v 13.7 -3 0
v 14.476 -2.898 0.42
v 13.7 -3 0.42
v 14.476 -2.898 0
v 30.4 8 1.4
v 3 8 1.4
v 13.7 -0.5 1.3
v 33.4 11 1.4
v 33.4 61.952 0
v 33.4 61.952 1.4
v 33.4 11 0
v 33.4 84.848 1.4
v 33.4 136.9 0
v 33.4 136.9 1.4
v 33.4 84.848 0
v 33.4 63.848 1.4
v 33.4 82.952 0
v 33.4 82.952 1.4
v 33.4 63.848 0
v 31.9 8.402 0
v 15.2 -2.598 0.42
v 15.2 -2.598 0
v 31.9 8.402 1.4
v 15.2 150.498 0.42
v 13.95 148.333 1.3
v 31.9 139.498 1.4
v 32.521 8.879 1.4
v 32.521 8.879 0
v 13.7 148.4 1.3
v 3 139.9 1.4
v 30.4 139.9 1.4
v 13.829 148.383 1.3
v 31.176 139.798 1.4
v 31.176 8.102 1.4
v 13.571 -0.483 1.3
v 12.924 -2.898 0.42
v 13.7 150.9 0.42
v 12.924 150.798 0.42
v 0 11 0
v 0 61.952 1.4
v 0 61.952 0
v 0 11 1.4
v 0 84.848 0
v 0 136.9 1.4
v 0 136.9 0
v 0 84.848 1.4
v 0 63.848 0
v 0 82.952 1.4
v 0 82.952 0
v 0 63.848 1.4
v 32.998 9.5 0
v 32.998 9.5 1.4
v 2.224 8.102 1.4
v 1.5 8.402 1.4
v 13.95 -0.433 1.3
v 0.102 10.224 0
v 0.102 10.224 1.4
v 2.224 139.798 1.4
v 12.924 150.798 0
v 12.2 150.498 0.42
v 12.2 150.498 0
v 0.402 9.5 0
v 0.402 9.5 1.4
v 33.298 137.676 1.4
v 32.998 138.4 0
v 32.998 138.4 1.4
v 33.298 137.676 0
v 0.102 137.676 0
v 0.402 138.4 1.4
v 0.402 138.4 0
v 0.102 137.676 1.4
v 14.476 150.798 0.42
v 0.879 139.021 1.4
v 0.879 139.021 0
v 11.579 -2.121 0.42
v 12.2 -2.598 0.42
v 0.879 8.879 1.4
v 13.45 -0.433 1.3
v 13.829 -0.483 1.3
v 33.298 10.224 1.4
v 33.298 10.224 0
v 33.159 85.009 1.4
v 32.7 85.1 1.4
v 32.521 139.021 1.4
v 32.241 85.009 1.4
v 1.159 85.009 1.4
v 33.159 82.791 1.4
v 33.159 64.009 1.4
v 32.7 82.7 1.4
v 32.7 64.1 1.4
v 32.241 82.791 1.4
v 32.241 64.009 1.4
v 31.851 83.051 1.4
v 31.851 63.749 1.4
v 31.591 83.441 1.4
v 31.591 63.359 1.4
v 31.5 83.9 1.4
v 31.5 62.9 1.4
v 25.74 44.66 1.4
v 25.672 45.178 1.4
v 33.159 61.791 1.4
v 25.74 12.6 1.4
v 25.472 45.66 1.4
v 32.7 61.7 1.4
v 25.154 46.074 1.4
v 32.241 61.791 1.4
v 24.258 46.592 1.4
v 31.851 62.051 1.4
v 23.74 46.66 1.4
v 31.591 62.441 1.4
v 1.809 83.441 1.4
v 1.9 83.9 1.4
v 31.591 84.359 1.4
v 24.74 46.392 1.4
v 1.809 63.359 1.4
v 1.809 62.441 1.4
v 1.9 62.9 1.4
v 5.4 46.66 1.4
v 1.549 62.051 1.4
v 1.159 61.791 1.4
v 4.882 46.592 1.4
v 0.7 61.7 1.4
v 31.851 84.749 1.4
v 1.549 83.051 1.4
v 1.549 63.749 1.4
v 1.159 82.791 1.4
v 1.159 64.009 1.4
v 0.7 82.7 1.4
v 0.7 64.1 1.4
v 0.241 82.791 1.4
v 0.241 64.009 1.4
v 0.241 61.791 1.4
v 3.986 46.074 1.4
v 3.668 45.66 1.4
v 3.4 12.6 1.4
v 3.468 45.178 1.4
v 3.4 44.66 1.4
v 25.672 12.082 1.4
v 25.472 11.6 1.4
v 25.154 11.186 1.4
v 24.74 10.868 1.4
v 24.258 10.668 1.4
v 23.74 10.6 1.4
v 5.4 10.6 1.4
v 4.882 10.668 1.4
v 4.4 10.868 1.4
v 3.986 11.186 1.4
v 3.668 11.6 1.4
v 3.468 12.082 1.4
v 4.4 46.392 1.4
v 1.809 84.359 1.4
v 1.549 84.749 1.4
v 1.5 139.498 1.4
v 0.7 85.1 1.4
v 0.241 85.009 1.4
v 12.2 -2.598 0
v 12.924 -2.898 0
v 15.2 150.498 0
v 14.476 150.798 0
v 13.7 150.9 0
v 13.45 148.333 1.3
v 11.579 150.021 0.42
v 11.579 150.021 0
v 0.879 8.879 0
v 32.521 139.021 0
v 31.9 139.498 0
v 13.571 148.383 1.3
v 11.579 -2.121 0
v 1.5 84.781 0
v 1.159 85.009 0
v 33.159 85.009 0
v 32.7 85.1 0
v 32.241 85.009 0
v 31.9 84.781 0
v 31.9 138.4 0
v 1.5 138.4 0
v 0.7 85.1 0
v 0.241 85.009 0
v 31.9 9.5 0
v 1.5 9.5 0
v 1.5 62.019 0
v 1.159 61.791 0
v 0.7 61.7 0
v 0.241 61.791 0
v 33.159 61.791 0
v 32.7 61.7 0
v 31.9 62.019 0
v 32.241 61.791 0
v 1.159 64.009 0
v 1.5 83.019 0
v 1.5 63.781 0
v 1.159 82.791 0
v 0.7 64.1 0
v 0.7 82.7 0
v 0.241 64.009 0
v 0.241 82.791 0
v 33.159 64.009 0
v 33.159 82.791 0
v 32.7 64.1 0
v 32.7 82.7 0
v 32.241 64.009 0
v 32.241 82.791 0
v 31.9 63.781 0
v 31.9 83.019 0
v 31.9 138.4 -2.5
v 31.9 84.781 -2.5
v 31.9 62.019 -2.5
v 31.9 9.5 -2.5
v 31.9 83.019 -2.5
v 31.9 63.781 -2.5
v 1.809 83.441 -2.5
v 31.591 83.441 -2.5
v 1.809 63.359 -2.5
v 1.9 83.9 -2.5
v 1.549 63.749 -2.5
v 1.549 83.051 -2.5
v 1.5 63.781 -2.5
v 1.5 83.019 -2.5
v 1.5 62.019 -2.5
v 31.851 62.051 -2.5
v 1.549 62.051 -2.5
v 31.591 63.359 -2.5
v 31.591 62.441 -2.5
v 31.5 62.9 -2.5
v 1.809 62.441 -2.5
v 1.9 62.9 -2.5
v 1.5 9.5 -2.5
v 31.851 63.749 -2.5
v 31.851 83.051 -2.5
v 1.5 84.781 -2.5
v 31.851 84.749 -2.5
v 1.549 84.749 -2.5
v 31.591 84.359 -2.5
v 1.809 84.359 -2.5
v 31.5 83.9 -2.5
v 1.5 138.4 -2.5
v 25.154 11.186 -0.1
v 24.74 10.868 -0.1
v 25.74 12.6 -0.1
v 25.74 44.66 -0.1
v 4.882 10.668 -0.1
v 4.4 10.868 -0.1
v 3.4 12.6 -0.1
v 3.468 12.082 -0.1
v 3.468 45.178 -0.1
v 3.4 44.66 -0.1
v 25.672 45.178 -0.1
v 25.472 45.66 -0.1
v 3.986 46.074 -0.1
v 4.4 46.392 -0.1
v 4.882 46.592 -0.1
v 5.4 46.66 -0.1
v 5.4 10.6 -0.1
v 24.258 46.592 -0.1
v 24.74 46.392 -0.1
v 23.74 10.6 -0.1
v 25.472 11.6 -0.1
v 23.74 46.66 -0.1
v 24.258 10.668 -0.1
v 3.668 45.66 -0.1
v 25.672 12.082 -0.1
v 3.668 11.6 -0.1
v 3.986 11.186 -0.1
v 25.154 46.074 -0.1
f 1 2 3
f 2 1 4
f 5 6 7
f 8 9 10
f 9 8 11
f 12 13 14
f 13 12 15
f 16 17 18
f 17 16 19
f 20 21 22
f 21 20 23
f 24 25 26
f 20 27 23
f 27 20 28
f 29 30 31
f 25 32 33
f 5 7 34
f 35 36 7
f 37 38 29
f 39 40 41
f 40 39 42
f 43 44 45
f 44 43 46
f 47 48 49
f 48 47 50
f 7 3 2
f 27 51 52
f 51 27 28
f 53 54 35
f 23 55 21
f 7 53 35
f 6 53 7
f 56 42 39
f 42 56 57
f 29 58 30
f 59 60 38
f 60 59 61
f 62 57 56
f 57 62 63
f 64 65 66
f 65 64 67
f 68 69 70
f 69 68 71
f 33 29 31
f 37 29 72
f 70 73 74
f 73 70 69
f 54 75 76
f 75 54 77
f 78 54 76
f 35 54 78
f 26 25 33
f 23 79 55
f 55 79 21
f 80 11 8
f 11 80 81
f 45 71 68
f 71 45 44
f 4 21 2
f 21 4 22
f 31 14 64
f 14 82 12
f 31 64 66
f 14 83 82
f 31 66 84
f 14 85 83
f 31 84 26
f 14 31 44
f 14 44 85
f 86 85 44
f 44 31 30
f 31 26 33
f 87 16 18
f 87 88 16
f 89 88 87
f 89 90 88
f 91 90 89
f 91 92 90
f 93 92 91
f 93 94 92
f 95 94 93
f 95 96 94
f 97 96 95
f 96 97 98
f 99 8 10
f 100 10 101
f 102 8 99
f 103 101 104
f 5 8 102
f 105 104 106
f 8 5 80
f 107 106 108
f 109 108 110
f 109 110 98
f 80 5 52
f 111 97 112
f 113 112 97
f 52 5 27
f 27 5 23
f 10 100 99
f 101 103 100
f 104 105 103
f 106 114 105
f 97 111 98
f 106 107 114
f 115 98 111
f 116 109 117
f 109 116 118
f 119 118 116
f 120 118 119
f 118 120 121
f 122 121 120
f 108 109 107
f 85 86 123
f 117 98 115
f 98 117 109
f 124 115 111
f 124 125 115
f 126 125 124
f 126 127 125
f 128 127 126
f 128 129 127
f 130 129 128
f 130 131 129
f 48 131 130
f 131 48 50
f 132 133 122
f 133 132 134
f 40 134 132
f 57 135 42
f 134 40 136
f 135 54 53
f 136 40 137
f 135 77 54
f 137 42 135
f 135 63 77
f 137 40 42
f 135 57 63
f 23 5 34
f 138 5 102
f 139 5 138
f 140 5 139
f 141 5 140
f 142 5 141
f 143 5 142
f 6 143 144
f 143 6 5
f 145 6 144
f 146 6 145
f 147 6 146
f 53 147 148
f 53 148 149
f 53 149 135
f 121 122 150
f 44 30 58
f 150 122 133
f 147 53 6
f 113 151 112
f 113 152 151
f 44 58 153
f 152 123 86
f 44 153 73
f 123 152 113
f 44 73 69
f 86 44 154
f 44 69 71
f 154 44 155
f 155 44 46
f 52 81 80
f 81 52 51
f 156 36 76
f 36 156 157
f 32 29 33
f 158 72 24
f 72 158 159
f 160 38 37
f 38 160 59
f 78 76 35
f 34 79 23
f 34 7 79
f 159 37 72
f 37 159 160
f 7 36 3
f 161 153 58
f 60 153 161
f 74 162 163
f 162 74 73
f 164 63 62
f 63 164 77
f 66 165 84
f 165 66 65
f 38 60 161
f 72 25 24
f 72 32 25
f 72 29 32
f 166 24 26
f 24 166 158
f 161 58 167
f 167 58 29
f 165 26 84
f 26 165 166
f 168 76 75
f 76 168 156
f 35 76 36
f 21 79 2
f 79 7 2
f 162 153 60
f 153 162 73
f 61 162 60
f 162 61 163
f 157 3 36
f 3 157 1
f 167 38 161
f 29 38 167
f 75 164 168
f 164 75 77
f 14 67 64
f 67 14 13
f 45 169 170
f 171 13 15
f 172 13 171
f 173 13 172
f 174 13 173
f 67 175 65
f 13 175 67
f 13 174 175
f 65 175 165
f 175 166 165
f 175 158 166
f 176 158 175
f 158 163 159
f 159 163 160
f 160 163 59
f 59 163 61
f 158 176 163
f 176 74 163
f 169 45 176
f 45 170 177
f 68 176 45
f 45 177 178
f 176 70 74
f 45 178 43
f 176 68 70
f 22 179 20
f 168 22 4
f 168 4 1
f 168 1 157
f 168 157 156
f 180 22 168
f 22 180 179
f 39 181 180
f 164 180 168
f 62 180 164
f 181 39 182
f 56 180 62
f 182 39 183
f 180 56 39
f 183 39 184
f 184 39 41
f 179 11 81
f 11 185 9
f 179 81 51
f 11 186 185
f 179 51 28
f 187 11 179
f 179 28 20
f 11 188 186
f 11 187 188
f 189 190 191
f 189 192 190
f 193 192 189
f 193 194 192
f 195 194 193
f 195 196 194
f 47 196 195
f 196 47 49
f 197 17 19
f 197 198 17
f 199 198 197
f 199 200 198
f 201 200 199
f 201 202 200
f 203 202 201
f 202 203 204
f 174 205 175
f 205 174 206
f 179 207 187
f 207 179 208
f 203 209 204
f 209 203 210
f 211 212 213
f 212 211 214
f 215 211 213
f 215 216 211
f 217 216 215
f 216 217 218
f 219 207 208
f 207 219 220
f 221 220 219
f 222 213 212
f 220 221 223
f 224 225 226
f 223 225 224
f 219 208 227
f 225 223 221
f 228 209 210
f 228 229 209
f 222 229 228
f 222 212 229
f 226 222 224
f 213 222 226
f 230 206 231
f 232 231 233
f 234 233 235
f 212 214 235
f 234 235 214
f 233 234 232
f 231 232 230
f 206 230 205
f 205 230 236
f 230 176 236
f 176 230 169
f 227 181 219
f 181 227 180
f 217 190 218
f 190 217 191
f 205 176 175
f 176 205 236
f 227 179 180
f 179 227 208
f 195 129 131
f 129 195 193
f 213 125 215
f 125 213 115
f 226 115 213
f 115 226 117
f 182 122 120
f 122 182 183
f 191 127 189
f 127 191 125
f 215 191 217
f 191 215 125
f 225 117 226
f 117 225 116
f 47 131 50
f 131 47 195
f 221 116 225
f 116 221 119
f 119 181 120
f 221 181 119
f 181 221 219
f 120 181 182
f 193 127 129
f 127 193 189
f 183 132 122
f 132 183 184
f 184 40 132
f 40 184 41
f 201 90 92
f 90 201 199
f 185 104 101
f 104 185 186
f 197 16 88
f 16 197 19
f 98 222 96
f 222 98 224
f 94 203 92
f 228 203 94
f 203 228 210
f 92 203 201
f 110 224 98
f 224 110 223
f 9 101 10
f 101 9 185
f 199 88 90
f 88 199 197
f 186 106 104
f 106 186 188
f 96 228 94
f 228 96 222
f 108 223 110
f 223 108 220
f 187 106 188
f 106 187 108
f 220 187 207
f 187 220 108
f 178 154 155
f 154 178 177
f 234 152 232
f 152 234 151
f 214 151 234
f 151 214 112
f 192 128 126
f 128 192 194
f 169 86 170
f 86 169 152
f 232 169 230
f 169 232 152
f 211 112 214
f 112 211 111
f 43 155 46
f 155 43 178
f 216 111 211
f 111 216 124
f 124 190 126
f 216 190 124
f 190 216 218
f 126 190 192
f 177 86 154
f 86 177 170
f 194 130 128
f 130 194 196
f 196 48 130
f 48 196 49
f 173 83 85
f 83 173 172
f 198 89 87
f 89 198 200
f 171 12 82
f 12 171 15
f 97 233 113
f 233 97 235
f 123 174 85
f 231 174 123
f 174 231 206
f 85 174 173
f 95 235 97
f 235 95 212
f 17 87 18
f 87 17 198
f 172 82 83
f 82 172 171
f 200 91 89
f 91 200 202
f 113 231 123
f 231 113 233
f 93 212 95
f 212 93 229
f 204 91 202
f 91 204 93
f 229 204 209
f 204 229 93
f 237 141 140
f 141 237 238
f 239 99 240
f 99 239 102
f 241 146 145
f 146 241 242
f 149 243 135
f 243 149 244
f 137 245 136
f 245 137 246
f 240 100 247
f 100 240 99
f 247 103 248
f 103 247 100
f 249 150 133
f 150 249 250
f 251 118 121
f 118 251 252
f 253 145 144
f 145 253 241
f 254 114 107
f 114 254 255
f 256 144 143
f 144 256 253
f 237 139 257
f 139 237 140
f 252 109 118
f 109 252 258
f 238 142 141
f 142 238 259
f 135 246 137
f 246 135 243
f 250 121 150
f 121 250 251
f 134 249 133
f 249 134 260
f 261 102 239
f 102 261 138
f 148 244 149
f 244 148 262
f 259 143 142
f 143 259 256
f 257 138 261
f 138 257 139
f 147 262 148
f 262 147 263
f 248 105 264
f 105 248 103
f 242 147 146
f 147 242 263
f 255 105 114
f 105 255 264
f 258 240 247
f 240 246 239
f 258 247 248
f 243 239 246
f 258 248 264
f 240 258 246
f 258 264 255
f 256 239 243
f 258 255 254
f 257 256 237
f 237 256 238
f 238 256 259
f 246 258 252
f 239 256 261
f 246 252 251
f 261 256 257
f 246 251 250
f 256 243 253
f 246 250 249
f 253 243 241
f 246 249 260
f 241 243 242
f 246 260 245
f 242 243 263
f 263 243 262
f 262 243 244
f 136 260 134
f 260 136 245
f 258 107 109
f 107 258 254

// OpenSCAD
// Wasserraketen-Tracker — Deckel
// Passt auf rocket_case.scad v4
// Nur Display-Fenster offen · M2-Schrauben an den 4 PCB-Bossen

// ── Parameter (identisch mit rocket_case.scad) ────────────────────────────────
wall      = 1.4;
tol       = 0.3;

board_w   = 28.6;
board_l   = 43.5;
board_h   = 9.6;
sensor_l  = 37.0;
gap       = 2.0;
bat_w     = 30.0;
bat_l     = 44.0;

disp_w    = 22.34;
disp_h    = 36.06;
disp_off_x =  3.1;
disp_off_y =  2.3;

inner_w = max(board_w, bat_w) + tol * 2;
inner_l = board_l + gap + sensor_l + gap + bat_l + tol * 2;
inner_h = board_h + 3.0;

outer_w = inner_w + wall * 2;
outer_l = inner_l + wall * 2;
outer_h = inner_h + wall;

fairing  = 8.0;   // identisch mit rocket_tracker.scad
total_l  = outer_l + fairing * 2;

// Deckeldicke + Zunge
lid_h    = wall;        // obere Platte
tongue_h = 2.5;         // Zunge greift in Gehäuse
tongue_t = 0.1;         // Spiel Zunge → Gehäuse (Presspassung)

// Display-Fenster (gleiche Offsets wie Gehäuse)
disp_ox = disp_off_x + tol;
disp_oy = disp_off_y + tol + fairing;

// Deckel-Schraubenlöcher (gleiche Positionen wie Lid-Bossen im Gehäuse)
lid_m2_d    = 2.4;
lid_boss_r  = 3.0;
lid_y1      = fairing + wall + board_l + gap + 8;
lid_y2      = fairing + wall + board_l + gap + sensor_l - 8;

// ── Hilfsfunktionen ───────────────────────────────────────────────────────────
module rounded_box(w, l, h, r = 2) {
    hull()
        for (x = [r, w - r], y = [r, l - r])
            translate([x, y, 0]) cylinder(r = r, h = h, $fn = 24);
}

module fairing_shell(h) {
    hw = outer_w / 2;
    hull() {
        translate([0, fairing, 0])
            rounded_box(outer_w, outer_l, h, 3);
        translate([hw - 3, 0, 0])
            cylinder(r = 3, h = h * 0.3, $fn = 24);
        translate([hw - 3, 0, h * 0.3 - 0.1])
            cylinder(r1 = 3, r2 = 0.5, h = h * 0.7, $fn = 24);
        translate([hw - 3, total_l, 0])
            cylinder(r = 3, h = h * 0.3, $fn = 24);
        translate([hw - 3, total_l, h * 0.3 - 0.1])
            cylinder(r1 = 3, r2 = 0.5, h = h * 0.7, $fn = 24);
    }
}

// ── Deckel ────────────────────────────────────────────────────────────────────
module lid() {
    difference() {
        union() {
            // Obere Platte (aerodynamisches Profil)
            fairing_shell(lid_h);

            // Zunge — greift in Gehäuse, hält Deckel in Position
            translate([wall + tongue_t, fairing + wall + tongue_t, -tongue_h])
                cube([inner_w - tongue_t * 2,
                      inner_l - tongue_t * 2,
                      tongue_h]);
        }

        // Nur Display-Fenster ausschneiden
        translate([disp_ox, disp_oy, -0.1])
            rounded_box(disp_w, disp_h, lid_h + 0.2, 2);

        // M2-Durchgangslöcher zu den Lid-Bossen im Gehäuse
        for (by = [lid_y1, lid_y2])
            for (bx = [wall / 2, outer_w - wall / 2])
                translate([bx, by, -tongue_h - 0.1])
                    cylinder(d = lid_m2_d, h = lid_h + tongue_h + 0.2, $fn = 16);
    }
}

// ── Ausgabe ───────────────────────────────────────────────────────────────────
color("SteelBlue", 0.85) lid();

echo(str("Deckel: ", round(outer_w*10)/10, " × ",
         round(total_l*10)/10, " × ",
         round((lid_h + tongue_h)*10)/10, " mm"));
